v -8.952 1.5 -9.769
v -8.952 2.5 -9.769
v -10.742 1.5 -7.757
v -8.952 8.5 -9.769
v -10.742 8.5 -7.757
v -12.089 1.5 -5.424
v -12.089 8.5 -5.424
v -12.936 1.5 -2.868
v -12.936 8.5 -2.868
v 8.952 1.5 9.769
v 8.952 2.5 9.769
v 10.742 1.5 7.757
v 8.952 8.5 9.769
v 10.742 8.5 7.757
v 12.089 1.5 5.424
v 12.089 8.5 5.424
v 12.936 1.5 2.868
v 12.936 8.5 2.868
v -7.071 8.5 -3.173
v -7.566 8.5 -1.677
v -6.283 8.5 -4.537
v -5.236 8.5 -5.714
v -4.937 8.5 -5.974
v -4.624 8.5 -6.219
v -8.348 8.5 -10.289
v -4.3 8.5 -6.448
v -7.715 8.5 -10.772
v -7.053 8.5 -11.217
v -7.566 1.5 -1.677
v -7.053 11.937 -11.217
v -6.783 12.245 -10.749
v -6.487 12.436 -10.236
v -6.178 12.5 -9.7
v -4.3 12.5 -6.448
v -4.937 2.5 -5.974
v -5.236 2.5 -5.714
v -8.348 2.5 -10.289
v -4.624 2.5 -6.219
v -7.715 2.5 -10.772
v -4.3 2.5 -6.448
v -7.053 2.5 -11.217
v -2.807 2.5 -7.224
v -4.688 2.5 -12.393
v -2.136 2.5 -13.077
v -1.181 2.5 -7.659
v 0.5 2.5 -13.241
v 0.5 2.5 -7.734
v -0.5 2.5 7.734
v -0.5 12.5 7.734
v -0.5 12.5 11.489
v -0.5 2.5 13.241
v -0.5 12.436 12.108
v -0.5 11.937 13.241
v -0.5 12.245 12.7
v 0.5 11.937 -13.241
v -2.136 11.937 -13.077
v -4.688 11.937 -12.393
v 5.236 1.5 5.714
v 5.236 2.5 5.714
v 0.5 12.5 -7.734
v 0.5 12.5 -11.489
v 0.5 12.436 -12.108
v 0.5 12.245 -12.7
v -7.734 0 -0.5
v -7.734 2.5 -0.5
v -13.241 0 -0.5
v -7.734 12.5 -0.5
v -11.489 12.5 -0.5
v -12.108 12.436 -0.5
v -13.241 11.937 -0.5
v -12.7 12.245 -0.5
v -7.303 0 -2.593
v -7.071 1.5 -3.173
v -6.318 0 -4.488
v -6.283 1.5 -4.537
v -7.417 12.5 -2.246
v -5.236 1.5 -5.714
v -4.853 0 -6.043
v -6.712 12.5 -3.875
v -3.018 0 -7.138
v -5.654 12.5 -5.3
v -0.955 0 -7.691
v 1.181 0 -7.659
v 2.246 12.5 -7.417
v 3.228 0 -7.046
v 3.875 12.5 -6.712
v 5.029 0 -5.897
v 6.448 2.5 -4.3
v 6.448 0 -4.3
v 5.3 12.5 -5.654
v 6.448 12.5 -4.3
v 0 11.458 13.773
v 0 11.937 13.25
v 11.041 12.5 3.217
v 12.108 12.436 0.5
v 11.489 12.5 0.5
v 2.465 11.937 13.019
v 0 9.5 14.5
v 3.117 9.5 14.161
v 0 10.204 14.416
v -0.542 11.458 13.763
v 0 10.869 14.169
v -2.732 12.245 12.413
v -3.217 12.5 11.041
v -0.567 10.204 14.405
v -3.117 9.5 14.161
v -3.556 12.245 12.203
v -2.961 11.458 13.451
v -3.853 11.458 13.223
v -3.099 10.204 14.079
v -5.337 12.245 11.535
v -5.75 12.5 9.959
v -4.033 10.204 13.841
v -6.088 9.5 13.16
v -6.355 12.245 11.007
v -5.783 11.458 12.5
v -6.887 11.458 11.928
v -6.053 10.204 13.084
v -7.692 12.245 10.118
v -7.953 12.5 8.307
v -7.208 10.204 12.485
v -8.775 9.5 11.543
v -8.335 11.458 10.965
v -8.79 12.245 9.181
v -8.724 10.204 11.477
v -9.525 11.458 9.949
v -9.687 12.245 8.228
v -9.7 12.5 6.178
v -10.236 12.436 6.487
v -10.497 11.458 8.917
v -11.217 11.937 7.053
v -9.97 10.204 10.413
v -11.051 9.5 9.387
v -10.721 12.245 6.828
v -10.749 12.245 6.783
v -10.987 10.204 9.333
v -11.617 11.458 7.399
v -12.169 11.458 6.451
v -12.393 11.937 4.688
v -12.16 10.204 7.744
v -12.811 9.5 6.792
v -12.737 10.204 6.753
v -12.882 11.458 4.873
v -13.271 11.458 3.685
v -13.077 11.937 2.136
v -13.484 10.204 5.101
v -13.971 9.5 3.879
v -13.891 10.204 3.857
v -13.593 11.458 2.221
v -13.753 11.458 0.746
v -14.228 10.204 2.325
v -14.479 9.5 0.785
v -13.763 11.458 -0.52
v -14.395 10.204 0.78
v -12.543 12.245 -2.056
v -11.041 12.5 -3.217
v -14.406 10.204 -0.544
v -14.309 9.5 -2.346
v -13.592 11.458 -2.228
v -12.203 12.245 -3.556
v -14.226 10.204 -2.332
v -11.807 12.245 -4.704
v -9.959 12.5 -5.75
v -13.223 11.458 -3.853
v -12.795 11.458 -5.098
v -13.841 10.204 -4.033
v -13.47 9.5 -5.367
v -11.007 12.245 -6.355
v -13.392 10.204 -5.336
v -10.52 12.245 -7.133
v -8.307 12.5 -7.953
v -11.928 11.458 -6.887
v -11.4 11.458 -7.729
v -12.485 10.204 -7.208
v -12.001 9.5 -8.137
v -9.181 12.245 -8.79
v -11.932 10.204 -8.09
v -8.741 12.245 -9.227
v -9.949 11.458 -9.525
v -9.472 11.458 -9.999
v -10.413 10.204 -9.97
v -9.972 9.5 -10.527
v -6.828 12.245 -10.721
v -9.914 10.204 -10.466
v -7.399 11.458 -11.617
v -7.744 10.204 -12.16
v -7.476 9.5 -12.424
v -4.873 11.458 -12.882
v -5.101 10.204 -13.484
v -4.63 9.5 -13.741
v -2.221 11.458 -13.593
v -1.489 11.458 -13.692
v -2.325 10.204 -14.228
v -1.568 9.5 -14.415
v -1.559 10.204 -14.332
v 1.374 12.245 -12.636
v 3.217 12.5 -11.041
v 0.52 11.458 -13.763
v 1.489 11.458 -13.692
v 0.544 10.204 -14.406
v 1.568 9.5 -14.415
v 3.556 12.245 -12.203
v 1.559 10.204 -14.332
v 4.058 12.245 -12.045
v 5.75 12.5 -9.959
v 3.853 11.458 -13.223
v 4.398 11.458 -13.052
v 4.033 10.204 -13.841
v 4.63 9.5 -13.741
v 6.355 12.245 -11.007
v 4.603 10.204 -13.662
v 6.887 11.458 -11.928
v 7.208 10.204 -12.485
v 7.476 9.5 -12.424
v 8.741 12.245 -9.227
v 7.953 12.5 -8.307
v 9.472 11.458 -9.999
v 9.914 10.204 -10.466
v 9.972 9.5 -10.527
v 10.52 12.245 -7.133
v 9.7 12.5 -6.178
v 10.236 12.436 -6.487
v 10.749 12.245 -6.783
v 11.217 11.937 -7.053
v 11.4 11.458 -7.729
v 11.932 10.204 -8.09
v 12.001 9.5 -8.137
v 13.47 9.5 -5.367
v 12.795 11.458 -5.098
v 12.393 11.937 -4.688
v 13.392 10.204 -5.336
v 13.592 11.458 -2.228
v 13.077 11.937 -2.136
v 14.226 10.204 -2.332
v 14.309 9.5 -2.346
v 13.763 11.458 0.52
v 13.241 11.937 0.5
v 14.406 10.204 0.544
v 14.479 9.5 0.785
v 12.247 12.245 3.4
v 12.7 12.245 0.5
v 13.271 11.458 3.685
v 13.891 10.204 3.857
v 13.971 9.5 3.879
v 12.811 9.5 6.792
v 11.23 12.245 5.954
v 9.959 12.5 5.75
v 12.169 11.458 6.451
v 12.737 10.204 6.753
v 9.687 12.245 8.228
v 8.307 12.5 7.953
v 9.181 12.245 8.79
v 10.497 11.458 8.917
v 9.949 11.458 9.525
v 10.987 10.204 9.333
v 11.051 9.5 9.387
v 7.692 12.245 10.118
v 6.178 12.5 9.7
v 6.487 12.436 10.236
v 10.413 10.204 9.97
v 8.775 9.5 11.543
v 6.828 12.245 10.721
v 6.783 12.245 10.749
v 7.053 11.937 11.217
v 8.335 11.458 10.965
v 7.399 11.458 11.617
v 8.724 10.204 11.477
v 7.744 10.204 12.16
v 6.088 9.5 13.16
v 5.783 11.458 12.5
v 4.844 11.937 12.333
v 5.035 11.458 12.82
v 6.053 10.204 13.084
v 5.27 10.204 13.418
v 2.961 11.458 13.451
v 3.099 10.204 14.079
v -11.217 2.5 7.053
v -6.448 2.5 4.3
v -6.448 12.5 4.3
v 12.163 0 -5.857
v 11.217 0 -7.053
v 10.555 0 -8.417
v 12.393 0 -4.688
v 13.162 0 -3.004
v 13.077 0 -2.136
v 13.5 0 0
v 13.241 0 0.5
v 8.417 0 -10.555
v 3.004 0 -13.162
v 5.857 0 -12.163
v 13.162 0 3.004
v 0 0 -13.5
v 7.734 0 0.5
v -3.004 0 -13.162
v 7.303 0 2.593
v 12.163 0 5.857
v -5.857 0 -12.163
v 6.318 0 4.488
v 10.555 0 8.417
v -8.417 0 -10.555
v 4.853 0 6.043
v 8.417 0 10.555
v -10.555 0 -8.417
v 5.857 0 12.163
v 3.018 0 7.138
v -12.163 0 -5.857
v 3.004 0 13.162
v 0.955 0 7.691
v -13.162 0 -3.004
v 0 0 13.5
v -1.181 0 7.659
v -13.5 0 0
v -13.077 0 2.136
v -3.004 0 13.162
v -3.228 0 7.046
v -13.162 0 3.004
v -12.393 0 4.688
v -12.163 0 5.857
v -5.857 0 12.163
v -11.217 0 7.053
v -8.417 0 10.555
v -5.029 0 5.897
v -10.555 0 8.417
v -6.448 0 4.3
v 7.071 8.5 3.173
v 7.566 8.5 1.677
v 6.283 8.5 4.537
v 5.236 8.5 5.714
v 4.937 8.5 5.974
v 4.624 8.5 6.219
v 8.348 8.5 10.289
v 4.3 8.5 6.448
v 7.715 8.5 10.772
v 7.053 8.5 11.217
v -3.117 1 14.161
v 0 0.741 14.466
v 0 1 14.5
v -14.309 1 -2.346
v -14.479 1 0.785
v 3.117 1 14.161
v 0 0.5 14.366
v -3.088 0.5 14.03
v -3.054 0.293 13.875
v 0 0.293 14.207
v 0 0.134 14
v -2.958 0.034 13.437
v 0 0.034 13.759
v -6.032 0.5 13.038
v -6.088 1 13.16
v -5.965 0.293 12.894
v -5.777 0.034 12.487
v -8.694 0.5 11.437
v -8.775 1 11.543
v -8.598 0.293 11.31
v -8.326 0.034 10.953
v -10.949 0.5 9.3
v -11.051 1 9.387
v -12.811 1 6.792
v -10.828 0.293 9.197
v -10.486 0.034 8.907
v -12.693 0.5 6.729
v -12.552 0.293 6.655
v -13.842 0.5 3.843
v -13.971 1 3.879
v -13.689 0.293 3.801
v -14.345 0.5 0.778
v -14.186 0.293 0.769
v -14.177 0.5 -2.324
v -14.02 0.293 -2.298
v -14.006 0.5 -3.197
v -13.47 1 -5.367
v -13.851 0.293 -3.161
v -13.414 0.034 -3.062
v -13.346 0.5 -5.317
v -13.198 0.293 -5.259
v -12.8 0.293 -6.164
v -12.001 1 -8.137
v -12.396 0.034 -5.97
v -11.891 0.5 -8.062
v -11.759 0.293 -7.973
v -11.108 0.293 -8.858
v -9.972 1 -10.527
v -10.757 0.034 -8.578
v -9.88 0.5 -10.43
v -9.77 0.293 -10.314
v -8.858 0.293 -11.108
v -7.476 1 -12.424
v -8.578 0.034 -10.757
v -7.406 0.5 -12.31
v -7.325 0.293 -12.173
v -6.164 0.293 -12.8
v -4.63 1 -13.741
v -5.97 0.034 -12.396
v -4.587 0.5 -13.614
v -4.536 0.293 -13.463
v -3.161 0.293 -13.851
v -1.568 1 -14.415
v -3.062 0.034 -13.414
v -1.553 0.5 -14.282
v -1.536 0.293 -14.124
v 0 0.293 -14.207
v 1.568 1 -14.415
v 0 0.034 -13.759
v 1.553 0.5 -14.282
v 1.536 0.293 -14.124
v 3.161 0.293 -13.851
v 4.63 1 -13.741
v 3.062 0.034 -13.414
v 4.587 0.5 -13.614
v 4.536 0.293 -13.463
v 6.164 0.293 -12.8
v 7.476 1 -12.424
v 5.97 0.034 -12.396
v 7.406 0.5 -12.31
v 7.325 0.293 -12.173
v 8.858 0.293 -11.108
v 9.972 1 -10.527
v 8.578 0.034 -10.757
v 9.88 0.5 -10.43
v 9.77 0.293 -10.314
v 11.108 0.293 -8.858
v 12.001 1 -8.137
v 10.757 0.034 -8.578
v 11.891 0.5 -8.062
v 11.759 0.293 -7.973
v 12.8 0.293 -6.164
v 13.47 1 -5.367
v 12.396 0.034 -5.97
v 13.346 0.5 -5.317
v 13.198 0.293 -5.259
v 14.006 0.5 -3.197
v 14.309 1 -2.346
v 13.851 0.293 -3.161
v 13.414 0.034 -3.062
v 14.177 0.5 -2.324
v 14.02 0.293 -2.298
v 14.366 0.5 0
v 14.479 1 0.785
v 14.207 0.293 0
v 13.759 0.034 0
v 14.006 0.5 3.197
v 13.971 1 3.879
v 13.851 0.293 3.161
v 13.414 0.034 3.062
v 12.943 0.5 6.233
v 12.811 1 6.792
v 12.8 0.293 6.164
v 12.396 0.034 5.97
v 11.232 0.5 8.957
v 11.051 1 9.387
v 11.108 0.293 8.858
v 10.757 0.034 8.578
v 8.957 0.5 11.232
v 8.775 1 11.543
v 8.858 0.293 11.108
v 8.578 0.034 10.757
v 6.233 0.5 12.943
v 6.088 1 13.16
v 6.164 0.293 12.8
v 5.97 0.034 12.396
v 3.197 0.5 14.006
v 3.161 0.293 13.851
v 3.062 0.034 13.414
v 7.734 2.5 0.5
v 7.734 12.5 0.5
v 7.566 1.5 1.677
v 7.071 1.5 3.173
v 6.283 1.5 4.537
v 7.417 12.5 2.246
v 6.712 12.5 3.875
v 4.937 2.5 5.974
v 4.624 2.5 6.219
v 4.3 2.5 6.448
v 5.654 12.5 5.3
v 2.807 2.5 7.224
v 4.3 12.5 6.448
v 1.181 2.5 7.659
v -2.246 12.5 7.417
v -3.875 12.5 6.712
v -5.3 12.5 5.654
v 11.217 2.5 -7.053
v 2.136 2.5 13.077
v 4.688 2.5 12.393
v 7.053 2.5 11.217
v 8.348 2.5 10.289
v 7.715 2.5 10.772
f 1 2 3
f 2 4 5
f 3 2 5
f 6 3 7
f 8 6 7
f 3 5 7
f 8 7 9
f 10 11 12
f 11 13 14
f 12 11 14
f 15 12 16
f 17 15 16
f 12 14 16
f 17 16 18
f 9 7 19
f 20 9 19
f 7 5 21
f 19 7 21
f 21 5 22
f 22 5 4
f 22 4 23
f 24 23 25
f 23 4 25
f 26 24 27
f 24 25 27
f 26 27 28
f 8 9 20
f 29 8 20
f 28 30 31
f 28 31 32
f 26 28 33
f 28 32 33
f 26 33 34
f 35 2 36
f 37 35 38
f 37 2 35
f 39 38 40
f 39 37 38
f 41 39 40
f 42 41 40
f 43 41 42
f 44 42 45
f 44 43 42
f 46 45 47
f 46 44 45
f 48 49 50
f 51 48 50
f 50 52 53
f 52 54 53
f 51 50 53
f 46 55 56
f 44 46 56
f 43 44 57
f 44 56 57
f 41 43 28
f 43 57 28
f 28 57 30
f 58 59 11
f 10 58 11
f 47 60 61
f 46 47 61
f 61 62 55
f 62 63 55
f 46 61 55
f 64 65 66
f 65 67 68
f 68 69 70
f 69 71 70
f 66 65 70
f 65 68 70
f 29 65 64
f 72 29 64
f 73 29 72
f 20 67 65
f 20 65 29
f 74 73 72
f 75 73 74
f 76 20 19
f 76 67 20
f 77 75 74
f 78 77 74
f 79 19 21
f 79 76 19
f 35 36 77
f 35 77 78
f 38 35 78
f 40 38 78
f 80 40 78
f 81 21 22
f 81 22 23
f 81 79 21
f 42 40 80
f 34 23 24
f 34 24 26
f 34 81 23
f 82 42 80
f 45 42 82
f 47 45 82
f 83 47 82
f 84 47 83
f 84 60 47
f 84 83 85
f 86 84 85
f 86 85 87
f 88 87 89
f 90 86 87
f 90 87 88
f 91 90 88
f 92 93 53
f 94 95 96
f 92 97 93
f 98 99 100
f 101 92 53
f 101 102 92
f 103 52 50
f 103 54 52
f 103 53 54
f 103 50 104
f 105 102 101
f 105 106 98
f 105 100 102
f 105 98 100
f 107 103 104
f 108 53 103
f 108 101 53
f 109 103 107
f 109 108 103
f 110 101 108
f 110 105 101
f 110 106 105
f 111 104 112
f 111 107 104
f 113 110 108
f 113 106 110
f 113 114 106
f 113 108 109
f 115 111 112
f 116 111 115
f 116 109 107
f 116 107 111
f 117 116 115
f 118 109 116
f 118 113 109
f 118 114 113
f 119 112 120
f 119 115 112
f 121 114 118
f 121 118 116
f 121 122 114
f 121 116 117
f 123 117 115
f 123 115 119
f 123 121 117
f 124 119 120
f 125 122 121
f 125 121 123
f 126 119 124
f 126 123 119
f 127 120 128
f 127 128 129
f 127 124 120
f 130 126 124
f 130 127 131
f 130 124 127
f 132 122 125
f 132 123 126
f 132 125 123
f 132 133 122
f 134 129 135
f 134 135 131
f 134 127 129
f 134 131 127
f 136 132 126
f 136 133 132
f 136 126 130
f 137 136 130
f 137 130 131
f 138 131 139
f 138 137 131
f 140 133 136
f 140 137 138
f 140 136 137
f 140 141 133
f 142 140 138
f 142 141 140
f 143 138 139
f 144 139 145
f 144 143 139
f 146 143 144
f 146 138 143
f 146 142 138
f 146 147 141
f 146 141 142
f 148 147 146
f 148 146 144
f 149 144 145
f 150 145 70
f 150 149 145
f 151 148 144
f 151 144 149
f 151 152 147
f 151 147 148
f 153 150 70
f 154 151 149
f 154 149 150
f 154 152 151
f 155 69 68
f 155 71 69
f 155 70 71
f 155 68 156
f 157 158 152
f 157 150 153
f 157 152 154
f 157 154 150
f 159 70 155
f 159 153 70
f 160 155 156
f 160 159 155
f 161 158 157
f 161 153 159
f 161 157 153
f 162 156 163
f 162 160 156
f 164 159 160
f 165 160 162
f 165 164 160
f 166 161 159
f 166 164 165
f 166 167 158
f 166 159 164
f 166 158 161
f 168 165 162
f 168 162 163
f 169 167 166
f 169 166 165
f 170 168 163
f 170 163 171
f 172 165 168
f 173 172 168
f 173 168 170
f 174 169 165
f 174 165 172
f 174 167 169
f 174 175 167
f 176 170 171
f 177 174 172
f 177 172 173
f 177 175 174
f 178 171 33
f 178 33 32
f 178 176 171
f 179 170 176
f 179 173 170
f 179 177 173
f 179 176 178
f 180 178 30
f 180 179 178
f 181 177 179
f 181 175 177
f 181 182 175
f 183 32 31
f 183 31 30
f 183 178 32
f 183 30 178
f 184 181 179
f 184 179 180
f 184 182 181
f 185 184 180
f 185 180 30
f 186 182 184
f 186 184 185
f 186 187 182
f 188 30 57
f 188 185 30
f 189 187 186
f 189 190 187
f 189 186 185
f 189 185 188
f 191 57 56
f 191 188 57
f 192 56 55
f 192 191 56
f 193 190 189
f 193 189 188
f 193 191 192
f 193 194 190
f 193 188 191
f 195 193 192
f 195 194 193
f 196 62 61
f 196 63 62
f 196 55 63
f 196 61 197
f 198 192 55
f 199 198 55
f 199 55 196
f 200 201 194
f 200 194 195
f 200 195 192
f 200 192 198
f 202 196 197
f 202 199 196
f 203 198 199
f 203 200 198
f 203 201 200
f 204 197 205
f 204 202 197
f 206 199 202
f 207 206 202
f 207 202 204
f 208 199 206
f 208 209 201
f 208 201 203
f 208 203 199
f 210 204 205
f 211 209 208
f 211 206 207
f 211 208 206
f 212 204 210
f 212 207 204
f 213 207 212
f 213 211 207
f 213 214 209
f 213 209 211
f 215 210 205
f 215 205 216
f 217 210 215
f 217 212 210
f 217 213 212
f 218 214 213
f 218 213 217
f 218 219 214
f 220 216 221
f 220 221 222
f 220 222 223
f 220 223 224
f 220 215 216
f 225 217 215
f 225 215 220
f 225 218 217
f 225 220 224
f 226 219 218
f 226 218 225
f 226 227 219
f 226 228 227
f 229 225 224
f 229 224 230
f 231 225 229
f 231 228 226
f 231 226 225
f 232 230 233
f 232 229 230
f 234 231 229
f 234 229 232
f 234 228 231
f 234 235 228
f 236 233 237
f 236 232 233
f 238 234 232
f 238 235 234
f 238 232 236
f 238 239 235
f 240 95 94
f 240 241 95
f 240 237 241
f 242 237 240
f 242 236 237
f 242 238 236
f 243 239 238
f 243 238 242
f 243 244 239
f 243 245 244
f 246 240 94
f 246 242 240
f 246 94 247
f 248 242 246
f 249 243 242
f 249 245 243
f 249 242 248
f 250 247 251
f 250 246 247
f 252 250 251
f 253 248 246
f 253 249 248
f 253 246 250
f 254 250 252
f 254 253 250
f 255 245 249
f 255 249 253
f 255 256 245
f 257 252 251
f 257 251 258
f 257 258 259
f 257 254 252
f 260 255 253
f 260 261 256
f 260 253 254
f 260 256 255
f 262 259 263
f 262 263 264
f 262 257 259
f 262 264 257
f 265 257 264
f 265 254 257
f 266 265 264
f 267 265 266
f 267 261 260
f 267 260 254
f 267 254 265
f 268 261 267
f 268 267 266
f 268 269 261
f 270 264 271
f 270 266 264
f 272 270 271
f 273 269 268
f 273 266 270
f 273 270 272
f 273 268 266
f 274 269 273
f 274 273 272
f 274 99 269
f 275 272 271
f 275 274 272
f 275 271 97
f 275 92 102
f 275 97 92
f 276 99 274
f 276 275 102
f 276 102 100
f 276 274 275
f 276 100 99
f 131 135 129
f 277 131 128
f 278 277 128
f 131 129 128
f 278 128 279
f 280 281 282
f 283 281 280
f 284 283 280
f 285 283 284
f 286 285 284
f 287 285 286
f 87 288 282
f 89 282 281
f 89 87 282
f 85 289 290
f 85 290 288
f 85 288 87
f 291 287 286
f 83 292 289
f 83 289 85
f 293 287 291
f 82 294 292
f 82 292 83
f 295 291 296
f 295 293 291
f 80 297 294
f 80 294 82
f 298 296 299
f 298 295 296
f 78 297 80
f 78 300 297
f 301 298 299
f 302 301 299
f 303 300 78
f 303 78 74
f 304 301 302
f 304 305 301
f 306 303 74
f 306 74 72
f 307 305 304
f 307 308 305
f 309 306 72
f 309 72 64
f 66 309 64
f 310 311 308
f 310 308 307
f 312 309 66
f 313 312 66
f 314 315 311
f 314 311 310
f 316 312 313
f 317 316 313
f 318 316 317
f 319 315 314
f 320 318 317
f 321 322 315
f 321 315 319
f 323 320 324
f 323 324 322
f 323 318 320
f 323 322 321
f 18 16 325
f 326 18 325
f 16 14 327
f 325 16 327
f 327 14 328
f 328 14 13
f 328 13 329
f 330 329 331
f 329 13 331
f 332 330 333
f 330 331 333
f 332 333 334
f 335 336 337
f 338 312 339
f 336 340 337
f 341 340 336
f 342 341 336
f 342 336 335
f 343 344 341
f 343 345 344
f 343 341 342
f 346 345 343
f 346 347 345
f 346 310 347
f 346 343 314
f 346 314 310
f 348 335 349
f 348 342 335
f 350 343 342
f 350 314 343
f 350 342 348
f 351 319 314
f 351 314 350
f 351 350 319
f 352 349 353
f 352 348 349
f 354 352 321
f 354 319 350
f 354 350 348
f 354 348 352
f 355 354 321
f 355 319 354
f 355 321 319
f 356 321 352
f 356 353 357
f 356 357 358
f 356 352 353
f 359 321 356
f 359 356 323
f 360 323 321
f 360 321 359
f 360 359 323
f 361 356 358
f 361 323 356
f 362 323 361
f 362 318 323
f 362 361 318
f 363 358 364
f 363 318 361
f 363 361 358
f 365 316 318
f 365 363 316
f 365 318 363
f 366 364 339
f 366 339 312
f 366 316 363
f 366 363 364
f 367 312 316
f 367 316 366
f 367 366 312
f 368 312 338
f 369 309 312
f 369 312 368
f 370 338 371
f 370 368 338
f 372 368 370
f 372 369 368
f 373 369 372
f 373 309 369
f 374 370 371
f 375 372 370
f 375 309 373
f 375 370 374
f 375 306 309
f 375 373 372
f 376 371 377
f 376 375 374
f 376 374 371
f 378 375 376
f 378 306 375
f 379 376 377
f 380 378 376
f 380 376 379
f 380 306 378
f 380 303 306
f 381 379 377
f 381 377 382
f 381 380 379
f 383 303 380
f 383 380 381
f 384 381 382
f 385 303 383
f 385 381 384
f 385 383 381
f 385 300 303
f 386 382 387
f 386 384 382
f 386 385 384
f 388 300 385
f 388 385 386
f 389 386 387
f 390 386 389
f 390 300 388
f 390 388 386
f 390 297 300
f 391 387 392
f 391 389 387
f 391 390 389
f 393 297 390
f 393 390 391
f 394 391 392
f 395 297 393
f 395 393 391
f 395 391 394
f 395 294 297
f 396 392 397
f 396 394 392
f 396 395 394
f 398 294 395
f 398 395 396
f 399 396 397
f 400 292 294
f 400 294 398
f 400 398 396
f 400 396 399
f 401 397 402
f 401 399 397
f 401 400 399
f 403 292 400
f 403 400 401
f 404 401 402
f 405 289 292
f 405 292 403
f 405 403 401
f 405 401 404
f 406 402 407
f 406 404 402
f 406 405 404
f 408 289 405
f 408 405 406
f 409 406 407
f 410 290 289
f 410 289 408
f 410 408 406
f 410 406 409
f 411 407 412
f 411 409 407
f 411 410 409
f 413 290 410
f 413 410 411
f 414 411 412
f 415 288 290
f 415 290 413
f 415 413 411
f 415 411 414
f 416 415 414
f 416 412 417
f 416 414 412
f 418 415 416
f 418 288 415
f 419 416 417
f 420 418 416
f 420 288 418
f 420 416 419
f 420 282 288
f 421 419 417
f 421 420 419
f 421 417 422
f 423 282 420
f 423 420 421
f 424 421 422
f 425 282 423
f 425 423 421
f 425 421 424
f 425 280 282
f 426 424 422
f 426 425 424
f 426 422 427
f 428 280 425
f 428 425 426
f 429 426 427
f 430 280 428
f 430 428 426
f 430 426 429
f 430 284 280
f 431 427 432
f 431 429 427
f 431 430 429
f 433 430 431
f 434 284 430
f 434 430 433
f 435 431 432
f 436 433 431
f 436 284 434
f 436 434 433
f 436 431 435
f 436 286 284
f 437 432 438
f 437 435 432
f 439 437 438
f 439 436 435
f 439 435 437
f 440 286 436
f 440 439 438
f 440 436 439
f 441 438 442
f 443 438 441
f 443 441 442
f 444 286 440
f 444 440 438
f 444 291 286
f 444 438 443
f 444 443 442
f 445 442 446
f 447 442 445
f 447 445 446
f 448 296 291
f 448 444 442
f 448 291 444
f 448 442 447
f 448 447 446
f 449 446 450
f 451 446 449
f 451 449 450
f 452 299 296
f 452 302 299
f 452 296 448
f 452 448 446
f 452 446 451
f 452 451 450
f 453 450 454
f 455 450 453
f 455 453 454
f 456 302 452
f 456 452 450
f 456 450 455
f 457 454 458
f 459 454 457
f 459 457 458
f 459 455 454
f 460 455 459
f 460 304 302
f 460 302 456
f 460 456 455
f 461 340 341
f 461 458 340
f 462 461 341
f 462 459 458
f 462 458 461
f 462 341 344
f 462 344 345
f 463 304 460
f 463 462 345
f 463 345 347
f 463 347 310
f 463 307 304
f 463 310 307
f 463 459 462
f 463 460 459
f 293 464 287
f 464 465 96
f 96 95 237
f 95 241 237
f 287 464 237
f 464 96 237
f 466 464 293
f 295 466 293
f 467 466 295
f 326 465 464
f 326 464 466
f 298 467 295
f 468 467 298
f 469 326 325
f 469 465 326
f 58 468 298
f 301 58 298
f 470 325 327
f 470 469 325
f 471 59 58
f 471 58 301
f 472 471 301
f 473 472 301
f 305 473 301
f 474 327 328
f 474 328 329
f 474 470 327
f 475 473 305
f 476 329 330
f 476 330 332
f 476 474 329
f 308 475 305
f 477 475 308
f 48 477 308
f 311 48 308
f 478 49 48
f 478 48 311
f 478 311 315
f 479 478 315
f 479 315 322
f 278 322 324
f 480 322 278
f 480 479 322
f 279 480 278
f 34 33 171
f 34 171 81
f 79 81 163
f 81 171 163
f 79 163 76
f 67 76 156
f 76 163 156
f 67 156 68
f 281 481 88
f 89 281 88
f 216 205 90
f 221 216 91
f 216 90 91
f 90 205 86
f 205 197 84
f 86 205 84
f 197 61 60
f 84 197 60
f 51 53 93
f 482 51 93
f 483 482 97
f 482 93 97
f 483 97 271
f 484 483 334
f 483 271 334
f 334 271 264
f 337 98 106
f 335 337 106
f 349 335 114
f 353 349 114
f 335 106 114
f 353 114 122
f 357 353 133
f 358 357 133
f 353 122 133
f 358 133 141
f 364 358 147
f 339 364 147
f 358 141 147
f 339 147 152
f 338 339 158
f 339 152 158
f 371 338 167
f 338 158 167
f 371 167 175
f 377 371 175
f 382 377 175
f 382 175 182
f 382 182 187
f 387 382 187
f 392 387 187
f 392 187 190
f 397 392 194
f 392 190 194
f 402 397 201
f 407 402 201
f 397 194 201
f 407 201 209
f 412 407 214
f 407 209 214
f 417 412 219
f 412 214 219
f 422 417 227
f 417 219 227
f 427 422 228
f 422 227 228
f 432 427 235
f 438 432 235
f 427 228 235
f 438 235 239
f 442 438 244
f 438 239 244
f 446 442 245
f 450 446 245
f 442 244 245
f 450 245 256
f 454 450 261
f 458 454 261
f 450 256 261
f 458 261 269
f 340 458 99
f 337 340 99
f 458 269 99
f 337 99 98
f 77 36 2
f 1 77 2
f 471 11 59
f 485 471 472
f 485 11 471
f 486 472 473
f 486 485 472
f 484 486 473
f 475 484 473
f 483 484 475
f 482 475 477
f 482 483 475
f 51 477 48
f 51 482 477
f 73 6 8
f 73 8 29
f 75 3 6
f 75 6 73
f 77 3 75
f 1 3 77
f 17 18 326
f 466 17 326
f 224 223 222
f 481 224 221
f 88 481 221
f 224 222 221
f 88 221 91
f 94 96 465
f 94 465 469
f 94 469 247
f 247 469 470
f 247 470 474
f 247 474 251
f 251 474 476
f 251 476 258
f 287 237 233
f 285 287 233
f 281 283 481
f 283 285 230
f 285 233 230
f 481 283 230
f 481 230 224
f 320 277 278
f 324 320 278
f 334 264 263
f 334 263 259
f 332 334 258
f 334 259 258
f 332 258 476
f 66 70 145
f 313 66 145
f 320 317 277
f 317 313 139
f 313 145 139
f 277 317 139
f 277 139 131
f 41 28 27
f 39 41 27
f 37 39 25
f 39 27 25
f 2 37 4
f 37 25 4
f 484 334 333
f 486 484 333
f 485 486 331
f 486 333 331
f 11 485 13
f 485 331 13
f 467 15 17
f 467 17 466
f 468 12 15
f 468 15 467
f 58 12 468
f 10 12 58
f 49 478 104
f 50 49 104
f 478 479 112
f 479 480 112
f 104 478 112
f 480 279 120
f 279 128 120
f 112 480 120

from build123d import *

# Parameters (mm, degrees)
SKETCH2_W          = 6.75
SKETCH2_H          = 12.5
CUT_EXTRUDE1_DEPTH = 10
CIRPATTERN1_COUNT  = 4
CUT_EXTRUDE2_DEPTH = 10
CUT_EXTRUDE3_START = 6
CUT_EXTRUDE3_DEPTH = 7
FILLET1_R          = 3
CUT_EXTRUDE5_START = 6
CUT_EXTRUDE5_DEPTH = 6
CIRPATTERN2_COUNT  = 2
FILLET2_R          = 1


with BuildPart() as part:
    # Sketch2 → Revolve1 (revolve)
    with BuildSketch(Plane(origin=(0, 0, 0), x_dir=(0, 0, -1), z_dir=(1, 0, 0))):
        with Locations((-11.125, 6.25)):
            Rectangle(SKETCH2_W, SKETCH2_H)
    revolve(axis=Axis((0, 31, 0), (0, -1, 0)))

    # Sketch3 → Cut-Extrude1 (cut)
    with BuildSketch(Plane(origin=(0, 12.5, 0), x_dir=(1, 0, 0), z_dir=(0, 1, 0))):
        with BuildLine():
            Line((-7.05329404, 11.216663639), (0.5, -1.866025404))
            Line((0.5, -1.866025404), (0.5, 13.240562677))
            ThreePointArc((0.5, 13.240562677), (-3.429352348, 12.798517198), (-7.05329404, 11.216663639))
        make_face()
    cut_extrude1 = extrude(amount=-CUT_EXTRUDE1_DEPTH, mode=Mode.SUBTRACT)

    # CirPattern1: Cut-Extrude1 ×4 about axis
    cirpattern1_axis = Axis((0, 0, 0), (0, 1, 0))
    for i in range(1, CIRPATTERN1_COUNT):
        add(cut_extrude1.rotate(cirpattern1_axis, i * 360 / CIRPATTERN1_COUNT), mode=Mode.SUBTRACT)

    # Sketch4 → Cut-Extrude2 (cut)
    with BuildSketch(Plane(origin=(0, 2.5, 0), x_dir=(1, 0, 0), z_dir=(0, 1, 0))):
        with BuildLine():
            Line((-7.733854149, 0.5), (-13.240562677, 0.5))
            ThreePointArc((-13.240562677, 0.5), (-12.798517198, -3.429352348), (-11.216663639, -7.05329404))
            Line((-11.216663639, -7.05329404), (-6.447714162, -4.299939776))
            ThreePointArc((-6.447714162, -4.299939776), (-7.485925154, -2.0058476), (-7.733854149, 0.5))
        make_face()
    cut_extrude2 = extrude(amount=-CUT_EXTRUDE2_DEPTH, mode=Mode.SUBTRACT)

    # Sketch5 → Cut-Extrude3 (cut)
    with BuildSketch(Plane(origin=(0, 2.5, 0), x_dir=(1, 0, 0), z_dir=(0, 1, 0)).offset(CUT_EXTRUDE3_START)):
        with BuildLine():
            Line((0, 0), (-8.951570251, 9.768924713))
            ThreePointArc((-8.951570251, 9.768924713), (-11.4748366, 6.625), (-12.935922094, 2.867824885))
            Line((-12.935922094, 2.867824885), (0, 0))
        make_face()
    cut_extrude3 = extrude(amount=-CUT_EXTRUDE3_DEPTH, mode=Mode.SUBTRACT)

    # Fillet1
    # the kernel refuses this fillet: 3 mm, written as the material it takes off along each edge
    with BuildSketch(Plane(origin=(0, 12.5, 0), x_dir=(0, 0, 1), z_dir=(1, 0, 0))) as fillet1_piece_1:
        with BuildLine():
            CenterArc((14.5 - FILLET1_R, FILLET1_R), FILLET1_R, 270, 90)
            Line((14.5 - FILLET1_R, 0), (14.5, 0))
            Line((14.5, 0), (14.5, FILLET1_R))
        make_face()
    revolve(axis=Axis((0, 12.5, 0), (0, -1, 0)), mode=Mode.SUBTRACT)

    # Sketch8 → Cut-Extrude5 (cut)
    with BuildSketch(Plane(origin=(0, 2.5, 0), x_dir=(1, 0, 0), z_dir=(0, 1, 0)).offset(CUT_EXTRUDE5_START)):
        with BuildLine():
            Line((-4.299939776, 6.447714162), (-7.05329404, 11.216663639))
            ThreePointArc((-7.05329404, 11.216663639), (-8.035104682, 10.535634426), (-8.951570251, 9.768924713))
            Line((-8.951570251, 9.768924713), (-5.235824109, 5.71389936))
            ThreePointArc((-5.235824109, 5.71389936), (-4.781978593, 6.098785186), (-4.299939776, 6.447714162))
        make_face()
    cut_extrude5 = extrude(amount=-CUT_EXTRUDE5_DEPTH, mode=Mode.SUBTRACT)

    # CirPattern2: Cut-Extrude2, Cut-Extrude3, Cut-Extrude5 ×2 about axis
    cirpattern2_axis = Axis((0, 0, 0), (0, 1, 0))
    add([cut_extrude2.rotate(cirpattern2_axis, i * 360 / CIRPATTERN2_COUNT) for i in range(1, CIRPATTERN2_COUNT)], mode=Mode.SUBTRACT)
    add([cut_extrude3.rotate(cirpattern2_axis, i * 360 / CIRPATTERN2_COUNT) for i in range(1, CIRPATTERN2_COUNT)], mode=Mode.SUBTRACT)
    add([cut_extrude5.rotate(cirpattern2_axis, i * 360 / CIRPATTERN2_COUNT) for i in range(1, CIRPATTERN2_COUNT)], mode=Mode.SUBTRACT)

    # Fillet2
    fillet2_edges = [part.edges().sort_by_distance(p)[0] for p in [
        (0, 0, -14.5),
    ]]
    fillet(fillet2_edges, radius=FILLET2_R)


solid = part.part
